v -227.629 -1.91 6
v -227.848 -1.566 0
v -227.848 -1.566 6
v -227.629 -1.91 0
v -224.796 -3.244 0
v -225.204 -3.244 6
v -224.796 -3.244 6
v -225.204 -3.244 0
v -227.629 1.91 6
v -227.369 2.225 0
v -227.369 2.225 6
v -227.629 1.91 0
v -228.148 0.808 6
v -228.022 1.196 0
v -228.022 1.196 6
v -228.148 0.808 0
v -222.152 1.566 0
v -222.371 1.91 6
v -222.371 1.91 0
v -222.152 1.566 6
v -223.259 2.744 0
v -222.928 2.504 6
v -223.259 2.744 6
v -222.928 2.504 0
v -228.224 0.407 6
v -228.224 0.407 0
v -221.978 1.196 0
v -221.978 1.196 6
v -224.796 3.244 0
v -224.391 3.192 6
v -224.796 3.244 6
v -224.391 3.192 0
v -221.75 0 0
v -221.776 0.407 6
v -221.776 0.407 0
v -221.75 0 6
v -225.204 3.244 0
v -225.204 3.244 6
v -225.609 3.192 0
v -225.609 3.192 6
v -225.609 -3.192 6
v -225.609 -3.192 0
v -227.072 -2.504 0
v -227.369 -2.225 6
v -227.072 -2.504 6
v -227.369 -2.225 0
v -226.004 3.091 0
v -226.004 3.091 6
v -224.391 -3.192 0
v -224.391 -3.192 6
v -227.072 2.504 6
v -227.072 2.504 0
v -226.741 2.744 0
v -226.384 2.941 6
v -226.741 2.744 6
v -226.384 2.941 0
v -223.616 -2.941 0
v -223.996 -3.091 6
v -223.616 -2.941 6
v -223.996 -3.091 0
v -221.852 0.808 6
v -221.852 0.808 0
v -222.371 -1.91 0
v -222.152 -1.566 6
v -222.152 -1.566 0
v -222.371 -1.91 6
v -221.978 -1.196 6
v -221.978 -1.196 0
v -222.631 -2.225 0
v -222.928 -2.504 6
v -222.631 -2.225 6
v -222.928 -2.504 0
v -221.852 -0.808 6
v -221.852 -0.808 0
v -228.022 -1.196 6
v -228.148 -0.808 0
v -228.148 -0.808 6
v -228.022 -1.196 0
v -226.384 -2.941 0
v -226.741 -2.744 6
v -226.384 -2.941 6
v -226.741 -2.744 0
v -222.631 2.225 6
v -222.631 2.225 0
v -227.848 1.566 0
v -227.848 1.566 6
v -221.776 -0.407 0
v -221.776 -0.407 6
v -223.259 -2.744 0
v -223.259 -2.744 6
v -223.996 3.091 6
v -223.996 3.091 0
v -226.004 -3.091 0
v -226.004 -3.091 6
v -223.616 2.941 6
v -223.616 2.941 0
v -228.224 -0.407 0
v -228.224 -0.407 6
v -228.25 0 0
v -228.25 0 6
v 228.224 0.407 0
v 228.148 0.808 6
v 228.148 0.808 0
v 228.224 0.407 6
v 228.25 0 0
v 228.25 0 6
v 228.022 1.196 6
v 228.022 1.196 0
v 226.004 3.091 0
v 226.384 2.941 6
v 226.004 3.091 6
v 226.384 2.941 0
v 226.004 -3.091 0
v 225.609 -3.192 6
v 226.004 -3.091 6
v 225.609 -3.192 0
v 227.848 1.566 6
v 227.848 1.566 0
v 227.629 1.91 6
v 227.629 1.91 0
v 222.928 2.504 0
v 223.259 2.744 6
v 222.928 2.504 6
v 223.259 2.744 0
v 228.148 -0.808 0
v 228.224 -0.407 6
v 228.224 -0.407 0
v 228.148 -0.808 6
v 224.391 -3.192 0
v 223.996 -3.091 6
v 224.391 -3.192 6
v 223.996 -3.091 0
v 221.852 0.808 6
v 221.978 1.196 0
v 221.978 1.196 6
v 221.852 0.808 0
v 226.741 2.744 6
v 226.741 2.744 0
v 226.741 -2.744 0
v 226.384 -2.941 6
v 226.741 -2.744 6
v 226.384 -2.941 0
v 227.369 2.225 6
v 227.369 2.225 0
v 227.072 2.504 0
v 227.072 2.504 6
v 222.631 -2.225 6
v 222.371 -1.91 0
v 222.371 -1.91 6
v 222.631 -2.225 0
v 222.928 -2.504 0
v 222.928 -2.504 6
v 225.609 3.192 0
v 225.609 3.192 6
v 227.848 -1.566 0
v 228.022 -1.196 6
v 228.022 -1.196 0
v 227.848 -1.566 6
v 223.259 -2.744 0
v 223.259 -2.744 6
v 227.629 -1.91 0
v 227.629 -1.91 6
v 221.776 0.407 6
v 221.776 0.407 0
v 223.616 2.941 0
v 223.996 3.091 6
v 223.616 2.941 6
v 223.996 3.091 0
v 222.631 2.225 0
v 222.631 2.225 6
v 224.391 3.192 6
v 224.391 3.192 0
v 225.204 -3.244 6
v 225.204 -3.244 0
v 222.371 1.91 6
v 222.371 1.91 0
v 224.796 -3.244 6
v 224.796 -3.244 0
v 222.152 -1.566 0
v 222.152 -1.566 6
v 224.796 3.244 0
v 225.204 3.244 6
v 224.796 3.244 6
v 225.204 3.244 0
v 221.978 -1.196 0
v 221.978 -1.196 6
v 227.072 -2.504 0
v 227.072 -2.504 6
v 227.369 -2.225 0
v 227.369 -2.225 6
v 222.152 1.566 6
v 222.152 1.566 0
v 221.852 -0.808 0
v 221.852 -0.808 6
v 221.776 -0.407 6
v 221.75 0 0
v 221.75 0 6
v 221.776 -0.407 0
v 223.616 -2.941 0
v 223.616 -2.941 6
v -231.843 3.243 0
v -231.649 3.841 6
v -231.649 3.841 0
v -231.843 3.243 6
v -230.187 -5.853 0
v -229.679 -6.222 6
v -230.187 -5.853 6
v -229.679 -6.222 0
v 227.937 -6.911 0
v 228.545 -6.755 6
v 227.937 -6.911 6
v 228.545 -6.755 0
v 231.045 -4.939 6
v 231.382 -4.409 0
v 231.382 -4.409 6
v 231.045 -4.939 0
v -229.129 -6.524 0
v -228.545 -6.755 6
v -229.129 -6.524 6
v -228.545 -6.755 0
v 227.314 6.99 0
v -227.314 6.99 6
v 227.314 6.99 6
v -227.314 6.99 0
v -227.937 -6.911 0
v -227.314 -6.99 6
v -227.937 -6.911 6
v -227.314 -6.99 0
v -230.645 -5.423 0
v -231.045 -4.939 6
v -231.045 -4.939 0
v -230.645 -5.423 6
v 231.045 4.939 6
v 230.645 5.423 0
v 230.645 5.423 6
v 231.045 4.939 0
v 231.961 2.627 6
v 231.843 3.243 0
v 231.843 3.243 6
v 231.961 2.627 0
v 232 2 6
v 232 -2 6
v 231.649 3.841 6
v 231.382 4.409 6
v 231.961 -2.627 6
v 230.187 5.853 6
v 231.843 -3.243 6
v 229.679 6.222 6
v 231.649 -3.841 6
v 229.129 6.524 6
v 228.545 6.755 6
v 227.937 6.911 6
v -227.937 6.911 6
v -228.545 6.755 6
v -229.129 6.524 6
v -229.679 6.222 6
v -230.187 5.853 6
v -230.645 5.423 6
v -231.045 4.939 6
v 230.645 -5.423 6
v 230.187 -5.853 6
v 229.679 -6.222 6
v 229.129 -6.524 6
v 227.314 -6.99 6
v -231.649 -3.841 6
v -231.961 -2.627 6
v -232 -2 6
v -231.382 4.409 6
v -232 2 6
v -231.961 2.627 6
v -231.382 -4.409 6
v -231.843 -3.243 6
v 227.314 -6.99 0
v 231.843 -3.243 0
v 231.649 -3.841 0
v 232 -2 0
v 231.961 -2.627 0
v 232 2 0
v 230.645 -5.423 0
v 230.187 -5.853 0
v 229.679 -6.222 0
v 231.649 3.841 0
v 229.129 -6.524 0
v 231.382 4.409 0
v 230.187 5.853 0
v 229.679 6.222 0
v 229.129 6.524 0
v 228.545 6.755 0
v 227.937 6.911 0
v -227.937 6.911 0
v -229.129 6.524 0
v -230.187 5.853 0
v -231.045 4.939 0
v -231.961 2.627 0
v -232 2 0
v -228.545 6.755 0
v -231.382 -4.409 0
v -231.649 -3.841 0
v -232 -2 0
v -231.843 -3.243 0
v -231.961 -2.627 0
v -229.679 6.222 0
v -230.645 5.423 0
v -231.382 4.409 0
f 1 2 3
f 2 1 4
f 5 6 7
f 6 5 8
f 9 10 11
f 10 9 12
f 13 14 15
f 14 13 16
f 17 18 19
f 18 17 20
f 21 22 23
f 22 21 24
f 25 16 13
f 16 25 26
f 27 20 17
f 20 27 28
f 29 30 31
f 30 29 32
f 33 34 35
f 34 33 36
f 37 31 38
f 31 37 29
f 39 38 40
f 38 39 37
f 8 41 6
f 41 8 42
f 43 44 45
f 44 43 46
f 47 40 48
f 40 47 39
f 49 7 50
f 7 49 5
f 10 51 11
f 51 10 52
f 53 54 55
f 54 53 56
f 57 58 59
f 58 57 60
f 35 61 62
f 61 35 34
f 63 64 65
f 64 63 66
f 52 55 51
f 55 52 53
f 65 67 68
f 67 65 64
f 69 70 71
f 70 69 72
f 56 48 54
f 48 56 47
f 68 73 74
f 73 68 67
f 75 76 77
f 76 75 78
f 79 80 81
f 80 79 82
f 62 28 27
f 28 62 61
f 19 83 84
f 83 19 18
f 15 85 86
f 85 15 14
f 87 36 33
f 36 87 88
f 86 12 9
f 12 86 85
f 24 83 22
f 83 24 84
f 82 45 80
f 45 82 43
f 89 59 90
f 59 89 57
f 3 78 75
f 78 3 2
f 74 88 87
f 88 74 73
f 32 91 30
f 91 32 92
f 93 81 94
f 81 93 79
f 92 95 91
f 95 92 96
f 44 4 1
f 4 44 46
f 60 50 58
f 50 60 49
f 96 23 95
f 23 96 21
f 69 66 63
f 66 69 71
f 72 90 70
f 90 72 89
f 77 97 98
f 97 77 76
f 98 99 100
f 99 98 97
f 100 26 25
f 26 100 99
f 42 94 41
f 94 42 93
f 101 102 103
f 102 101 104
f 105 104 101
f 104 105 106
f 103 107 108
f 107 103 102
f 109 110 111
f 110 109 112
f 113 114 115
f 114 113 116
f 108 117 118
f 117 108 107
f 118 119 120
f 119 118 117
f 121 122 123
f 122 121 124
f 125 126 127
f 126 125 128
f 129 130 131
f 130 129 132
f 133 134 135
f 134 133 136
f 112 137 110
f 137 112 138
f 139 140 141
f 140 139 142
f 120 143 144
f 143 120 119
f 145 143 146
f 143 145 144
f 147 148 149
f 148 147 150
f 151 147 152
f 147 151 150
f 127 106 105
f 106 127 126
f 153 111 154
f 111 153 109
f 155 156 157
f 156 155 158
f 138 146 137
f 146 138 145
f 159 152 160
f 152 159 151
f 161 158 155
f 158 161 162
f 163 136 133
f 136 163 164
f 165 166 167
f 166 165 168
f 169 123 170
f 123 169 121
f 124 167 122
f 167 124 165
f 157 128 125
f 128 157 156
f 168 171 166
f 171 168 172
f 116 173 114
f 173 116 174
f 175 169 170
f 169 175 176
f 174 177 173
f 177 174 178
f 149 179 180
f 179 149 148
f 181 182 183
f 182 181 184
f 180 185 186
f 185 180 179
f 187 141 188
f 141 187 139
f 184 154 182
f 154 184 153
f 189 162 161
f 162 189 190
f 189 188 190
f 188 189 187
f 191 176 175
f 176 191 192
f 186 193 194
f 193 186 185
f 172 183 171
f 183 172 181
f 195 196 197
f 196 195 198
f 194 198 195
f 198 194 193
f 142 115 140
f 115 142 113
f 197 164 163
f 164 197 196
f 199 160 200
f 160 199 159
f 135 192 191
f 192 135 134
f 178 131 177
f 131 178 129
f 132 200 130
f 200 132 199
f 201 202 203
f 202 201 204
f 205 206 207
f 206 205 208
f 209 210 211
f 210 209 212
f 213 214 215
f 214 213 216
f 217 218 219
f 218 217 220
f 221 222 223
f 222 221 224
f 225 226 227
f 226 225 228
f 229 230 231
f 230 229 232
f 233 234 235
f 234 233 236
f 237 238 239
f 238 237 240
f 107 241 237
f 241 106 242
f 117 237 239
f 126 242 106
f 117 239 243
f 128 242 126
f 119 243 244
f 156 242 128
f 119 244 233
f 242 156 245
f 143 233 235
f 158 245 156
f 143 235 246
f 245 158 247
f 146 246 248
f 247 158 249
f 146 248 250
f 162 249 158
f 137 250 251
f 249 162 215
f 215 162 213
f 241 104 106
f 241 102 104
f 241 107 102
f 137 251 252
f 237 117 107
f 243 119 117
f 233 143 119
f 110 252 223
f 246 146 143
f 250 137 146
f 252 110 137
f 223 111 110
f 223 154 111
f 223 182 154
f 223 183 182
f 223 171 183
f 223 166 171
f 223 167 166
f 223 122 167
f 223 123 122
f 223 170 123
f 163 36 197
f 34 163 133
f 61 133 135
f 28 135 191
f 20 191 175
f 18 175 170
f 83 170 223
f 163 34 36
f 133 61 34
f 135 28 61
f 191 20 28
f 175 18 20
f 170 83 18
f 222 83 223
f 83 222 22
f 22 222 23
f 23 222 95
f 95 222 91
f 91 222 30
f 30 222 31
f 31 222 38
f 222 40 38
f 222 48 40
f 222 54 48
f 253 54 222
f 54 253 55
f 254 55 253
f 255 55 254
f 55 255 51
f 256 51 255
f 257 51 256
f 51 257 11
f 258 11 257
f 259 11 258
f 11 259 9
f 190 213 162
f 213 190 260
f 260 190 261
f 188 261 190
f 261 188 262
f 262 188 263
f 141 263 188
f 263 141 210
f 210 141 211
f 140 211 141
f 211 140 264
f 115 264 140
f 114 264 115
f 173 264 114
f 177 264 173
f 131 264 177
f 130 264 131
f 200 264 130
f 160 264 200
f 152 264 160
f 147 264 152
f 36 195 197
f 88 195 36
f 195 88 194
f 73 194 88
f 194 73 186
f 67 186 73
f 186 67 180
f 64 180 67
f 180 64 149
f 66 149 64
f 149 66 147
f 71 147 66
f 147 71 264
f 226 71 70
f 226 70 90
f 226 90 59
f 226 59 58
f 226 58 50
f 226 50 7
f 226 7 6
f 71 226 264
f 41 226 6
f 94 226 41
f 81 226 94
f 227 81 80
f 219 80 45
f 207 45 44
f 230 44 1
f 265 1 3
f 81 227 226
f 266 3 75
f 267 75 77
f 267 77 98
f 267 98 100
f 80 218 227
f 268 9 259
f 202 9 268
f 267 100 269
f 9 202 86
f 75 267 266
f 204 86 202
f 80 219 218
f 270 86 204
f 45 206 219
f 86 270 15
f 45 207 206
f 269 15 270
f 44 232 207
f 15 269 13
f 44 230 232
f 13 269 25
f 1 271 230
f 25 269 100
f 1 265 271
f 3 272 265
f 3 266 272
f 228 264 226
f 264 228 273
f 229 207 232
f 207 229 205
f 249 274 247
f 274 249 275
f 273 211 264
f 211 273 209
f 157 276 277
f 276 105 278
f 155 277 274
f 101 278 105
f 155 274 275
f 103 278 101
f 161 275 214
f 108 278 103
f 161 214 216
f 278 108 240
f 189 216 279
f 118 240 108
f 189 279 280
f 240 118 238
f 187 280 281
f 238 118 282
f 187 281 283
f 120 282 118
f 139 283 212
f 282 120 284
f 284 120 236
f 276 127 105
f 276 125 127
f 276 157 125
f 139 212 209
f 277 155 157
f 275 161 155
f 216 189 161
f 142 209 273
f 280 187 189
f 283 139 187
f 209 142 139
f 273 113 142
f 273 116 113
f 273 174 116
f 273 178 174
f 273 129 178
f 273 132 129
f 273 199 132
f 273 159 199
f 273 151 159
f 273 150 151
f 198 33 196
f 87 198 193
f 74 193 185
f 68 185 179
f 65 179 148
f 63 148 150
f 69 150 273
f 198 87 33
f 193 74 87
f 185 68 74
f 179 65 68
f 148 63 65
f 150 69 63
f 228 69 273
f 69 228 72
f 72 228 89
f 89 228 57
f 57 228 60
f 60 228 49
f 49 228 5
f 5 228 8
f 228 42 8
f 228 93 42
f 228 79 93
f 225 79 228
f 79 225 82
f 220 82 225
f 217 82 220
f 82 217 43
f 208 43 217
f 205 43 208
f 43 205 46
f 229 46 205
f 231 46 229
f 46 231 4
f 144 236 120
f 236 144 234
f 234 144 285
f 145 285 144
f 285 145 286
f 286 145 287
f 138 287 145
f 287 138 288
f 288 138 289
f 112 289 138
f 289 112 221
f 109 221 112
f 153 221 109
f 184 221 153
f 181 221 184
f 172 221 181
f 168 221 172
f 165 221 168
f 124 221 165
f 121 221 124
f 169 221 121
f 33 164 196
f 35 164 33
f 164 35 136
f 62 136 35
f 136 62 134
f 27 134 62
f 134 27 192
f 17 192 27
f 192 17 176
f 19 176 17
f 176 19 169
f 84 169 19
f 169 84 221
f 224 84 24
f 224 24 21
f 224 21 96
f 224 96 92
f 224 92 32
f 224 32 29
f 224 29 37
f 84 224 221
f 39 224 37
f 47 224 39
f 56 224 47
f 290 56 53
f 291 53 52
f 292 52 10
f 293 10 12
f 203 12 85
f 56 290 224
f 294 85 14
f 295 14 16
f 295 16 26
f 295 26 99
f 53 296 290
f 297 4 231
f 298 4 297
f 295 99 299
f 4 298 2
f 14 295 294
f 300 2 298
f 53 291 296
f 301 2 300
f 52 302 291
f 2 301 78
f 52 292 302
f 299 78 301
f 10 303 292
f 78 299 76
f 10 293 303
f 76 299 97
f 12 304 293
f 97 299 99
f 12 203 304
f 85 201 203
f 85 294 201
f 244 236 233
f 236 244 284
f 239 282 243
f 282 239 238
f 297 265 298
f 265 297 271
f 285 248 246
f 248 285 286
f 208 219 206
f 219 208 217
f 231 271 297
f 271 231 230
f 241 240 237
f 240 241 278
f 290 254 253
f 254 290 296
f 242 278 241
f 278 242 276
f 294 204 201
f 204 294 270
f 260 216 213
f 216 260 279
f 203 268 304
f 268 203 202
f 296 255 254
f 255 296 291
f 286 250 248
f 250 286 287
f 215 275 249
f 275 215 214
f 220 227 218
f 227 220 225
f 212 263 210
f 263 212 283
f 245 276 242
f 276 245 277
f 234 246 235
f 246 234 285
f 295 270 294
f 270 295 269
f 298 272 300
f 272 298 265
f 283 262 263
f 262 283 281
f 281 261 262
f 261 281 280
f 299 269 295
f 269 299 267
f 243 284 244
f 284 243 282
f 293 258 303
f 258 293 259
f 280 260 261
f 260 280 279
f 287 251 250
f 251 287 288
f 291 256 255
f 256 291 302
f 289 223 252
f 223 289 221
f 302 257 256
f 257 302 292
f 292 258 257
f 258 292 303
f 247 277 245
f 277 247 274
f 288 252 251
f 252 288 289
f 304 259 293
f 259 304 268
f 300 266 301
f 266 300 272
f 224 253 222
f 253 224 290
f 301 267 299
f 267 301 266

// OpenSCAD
$fn = 50;


difference() {
	union() {
		hull() {
			translate(v = [-227.0000000000, 2.0000000000, 0]) {
				cylinder(h = 6, r = 5);
			}
			translate(v = [227.0000000000, 2.0000000000, 0]) {
				cylinder(h = 6, r = 5);
			}
			translate(v = [-227.0000000000, -2.0000000000, 0]) {
				cylinder(h = 6, r = 5);
			}
			translate(v = [227.0000000000, -2.0000000000, 0]) {
				cylinder(h = 6, r = 5);
			}
		}
	}
	union() {
		translate(v = [-225.0000000000, 0.0000000000, -100.0000000000]) {
			cylinder(h = 200, r = 3.2500000000);
		}
		translate(v = [-225.0000000000, 0.0000000000, -100.0000000000]) {
			cylinder(h = 200, r = 3.2500000000);
		}
		translate(v = [225.0000000000, 0.0000000000, -100.0000000000]) {
			cylinder(h = 200, r = 3.2500000000);
		}
		translate(v = [225.0000000000, 0.0000000000, -100.0000000000]) {
			cylinder(h = 200, r = 3.2500000000);
		}
	}
}
